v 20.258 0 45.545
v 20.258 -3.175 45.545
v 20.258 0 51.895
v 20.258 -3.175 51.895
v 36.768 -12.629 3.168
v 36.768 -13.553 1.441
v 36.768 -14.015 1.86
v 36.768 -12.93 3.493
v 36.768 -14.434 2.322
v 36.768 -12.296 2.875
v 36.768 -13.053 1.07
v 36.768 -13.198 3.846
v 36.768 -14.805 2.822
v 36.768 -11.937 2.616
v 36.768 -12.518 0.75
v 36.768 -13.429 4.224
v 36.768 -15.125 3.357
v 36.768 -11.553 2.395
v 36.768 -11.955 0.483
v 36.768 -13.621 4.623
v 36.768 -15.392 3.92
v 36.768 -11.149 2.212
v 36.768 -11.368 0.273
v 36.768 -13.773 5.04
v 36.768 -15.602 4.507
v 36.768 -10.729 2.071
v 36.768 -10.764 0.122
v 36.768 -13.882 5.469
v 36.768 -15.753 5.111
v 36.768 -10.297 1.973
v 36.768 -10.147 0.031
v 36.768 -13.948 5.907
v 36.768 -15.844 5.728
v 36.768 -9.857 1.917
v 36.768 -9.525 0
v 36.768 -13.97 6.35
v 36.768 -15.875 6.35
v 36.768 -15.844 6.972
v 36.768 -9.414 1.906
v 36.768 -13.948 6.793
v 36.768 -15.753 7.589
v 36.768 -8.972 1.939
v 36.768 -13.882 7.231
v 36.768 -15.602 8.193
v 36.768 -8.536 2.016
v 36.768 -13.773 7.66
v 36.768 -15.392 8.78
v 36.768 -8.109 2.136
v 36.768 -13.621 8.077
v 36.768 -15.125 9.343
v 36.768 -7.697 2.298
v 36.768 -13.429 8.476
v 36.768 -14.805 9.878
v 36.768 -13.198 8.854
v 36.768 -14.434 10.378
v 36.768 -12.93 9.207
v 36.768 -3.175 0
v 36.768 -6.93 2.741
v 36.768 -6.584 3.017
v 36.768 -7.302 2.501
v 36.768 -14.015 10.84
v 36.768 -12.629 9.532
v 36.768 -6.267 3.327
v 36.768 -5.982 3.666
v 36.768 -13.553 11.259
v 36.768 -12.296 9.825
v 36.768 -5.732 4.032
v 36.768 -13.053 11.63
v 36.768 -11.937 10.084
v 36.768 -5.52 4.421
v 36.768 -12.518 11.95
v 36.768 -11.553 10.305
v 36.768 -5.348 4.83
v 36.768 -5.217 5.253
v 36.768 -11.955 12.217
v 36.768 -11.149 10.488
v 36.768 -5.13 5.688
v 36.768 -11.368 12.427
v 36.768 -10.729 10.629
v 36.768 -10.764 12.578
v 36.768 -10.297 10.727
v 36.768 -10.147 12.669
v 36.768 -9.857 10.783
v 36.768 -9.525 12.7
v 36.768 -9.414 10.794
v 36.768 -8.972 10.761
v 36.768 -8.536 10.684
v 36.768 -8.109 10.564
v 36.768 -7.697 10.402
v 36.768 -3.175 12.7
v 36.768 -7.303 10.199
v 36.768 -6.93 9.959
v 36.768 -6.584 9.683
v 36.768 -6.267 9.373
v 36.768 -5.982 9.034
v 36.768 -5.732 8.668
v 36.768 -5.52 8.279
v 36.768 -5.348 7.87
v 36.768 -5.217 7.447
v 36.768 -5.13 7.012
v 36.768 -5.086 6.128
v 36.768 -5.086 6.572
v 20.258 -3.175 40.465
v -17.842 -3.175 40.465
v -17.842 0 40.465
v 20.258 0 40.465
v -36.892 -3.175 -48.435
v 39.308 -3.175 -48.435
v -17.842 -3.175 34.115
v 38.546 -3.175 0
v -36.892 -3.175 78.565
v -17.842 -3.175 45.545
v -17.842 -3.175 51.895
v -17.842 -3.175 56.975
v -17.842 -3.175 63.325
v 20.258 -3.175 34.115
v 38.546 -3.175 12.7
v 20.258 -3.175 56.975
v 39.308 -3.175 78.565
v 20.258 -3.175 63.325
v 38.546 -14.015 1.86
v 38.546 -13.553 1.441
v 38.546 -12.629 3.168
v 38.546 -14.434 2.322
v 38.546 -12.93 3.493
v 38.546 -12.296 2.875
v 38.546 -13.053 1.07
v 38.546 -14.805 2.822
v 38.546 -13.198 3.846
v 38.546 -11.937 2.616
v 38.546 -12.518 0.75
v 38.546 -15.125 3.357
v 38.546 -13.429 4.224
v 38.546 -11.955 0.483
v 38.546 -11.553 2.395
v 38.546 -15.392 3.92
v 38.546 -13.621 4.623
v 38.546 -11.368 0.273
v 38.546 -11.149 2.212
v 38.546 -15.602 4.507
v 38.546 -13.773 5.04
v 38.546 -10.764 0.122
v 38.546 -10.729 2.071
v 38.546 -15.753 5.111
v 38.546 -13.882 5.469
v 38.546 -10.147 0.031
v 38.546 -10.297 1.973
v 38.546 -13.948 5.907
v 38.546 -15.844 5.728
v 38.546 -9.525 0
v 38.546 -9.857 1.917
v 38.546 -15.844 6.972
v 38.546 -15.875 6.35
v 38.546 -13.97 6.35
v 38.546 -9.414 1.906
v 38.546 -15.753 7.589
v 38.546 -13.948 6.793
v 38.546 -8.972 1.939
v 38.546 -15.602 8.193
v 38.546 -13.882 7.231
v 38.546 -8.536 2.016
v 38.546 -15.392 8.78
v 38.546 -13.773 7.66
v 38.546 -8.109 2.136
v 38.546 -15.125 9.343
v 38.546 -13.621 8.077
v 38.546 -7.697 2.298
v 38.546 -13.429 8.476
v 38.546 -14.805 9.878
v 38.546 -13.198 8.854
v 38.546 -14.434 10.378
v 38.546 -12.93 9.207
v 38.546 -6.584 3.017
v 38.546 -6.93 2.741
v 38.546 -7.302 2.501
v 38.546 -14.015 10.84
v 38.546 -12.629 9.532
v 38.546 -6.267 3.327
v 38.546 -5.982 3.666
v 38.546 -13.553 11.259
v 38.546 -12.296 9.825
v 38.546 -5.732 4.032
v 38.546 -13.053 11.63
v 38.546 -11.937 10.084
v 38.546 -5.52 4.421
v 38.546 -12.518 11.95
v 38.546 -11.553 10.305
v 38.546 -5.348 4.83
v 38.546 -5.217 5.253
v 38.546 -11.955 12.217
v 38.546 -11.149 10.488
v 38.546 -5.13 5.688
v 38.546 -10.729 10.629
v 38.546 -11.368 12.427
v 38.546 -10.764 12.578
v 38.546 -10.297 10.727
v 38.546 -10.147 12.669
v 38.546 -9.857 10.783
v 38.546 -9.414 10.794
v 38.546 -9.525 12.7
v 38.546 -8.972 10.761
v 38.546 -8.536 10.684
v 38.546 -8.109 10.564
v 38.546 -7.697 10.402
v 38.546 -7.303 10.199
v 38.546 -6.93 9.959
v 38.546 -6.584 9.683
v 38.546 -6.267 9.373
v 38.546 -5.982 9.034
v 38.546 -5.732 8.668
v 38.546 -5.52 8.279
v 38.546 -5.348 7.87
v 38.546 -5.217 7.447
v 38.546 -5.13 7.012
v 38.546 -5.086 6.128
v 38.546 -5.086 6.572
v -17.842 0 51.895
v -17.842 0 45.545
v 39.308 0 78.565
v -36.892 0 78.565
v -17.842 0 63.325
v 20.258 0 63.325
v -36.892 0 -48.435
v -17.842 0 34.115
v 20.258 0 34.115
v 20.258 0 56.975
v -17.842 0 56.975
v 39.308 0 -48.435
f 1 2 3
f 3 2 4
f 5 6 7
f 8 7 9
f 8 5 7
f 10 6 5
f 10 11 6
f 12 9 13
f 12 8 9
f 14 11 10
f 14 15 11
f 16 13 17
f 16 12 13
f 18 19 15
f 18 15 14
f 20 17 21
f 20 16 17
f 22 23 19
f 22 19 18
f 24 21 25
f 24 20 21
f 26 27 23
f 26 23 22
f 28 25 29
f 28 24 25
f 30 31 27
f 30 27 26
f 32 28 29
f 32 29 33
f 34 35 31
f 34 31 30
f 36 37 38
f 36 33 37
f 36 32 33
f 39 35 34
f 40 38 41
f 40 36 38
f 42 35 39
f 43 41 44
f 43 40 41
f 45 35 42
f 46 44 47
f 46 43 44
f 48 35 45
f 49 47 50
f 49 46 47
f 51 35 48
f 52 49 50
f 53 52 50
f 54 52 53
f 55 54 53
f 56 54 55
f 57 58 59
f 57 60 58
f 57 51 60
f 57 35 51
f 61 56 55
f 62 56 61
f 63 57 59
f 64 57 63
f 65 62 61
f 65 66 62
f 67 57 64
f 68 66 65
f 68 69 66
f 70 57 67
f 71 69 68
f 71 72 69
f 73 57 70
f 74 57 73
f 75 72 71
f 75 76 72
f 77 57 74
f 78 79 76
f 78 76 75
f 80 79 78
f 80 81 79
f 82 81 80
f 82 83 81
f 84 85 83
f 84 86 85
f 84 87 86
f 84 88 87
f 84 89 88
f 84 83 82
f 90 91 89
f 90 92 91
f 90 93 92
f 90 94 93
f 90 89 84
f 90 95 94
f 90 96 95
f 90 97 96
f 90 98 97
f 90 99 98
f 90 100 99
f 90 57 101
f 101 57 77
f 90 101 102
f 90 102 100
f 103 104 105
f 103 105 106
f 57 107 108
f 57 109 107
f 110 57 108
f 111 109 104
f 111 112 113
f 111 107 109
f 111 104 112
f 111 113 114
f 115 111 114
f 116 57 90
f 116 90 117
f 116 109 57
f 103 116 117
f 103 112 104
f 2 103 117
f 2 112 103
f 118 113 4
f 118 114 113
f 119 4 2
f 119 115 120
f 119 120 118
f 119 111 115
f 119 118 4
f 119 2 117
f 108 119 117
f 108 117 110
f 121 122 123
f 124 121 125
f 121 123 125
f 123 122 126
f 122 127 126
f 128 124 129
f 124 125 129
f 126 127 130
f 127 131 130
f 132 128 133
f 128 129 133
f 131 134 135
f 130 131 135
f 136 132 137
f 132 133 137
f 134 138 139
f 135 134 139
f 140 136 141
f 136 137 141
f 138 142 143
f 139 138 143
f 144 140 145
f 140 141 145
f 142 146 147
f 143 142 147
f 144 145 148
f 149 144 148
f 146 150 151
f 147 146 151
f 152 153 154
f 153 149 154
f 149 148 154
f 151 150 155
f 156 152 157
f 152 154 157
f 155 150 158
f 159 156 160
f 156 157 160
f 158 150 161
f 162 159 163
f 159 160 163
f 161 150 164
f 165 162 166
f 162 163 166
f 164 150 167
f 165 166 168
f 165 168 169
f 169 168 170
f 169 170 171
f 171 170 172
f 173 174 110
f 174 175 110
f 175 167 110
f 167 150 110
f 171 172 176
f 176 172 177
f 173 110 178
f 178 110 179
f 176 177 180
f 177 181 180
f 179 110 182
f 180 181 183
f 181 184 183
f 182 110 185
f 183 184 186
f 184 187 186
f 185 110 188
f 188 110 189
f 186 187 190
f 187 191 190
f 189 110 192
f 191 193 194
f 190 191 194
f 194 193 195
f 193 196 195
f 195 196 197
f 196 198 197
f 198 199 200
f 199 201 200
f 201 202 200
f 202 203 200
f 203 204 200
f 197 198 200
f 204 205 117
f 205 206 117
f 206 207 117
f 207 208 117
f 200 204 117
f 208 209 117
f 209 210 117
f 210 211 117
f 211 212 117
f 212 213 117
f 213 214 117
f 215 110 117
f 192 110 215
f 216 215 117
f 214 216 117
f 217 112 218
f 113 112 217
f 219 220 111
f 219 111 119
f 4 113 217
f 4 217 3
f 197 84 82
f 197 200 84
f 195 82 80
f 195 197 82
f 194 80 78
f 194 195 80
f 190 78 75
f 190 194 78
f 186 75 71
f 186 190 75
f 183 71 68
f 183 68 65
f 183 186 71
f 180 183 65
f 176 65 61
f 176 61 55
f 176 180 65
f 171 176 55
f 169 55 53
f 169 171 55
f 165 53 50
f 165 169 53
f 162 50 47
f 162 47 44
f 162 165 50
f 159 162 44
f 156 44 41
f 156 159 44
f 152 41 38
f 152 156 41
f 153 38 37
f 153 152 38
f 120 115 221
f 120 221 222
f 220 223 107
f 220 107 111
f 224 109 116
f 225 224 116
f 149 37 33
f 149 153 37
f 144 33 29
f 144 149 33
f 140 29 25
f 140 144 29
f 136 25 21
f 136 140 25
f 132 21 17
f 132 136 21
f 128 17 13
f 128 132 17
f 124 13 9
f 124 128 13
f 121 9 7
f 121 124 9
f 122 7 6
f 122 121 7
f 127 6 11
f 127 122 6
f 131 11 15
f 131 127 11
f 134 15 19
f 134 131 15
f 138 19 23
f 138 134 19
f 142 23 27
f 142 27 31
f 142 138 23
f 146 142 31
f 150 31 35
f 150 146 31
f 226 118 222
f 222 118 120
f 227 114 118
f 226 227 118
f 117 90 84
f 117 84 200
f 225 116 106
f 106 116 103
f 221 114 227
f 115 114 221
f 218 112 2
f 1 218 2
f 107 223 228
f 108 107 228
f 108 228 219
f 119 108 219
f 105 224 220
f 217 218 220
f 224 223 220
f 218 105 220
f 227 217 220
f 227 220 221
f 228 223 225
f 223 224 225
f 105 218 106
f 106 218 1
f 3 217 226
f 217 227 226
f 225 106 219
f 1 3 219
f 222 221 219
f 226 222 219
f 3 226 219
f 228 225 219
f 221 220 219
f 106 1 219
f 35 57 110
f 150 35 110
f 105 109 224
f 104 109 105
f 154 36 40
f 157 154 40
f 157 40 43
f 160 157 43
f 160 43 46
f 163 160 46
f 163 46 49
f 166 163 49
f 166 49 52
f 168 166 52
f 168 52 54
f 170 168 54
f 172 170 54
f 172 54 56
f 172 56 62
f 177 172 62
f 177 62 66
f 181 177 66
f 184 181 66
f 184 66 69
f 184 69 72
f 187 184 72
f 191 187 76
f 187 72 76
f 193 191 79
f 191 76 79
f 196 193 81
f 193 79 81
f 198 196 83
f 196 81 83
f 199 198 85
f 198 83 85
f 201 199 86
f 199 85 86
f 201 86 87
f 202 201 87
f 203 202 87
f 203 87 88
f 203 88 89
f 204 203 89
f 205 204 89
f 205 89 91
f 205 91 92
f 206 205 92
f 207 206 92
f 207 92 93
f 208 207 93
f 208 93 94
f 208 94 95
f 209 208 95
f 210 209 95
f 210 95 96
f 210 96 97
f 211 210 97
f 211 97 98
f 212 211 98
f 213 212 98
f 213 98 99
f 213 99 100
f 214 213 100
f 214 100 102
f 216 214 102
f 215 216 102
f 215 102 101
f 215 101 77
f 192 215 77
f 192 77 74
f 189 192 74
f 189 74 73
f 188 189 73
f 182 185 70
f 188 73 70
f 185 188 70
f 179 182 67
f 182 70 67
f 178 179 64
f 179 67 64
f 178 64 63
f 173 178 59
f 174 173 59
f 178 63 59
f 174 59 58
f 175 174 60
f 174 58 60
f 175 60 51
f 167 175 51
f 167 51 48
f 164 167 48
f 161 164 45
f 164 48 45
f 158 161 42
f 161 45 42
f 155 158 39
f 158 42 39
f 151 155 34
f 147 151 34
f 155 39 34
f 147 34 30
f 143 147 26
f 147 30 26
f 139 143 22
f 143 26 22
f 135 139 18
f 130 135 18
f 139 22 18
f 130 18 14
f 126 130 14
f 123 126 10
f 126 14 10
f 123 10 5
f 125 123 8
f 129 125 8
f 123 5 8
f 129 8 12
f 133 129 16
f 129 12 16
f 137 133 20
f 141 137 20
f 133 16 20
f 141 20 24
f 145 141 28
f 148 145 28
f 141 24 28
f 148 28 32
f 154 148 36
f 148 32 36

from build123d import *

# Parameters (mm, degrees)
F0_W     = 76.2
F0_H     = 127
F1_DEPTH = 3.175
F2_W     = 38.1
F2_H     = 6.35
F3_DEPTH = 3.175
F4_W     = 1.778
F4_H     = 12.7
F5_DEPTH = 12.7
F6_R     = 6.35
F7_R     = 6.34999
F8_R     = 4.445
F9_DEPTH = 25.4


# Not quite as in the source:
# - a fillet or chamfer is up to 0.001 mm smaller than in the source, because OpenCascade refuses the exact size


with BuildPart() as f1:
    # F0 (on Front) → F1 (new body)
    with BuildSketch(Plane.XZ):
        with Locations((1.208204776, 15.0653144508)):
            Rectangle(F0_W, F0_H)
    extrude(amount=F1_DEPTH)

    # F2 (on face) → F3 (cut)
    with BuildSketch(Plane.XZ.offset(3.175)):
        with Locations((1.208204776, 60.1503144508)):
            Rectangle(F2_W, F2_H)
        with Locations((1.208204776, 48.7203144508)):
            Rectangle(F2_W, F2_H)
        with Locations((1.208204776, 37.2903144508)):
            Rectangle(F2_W, F2_H)
    extrude(amount=-F3_DEPTH, mode=Mode.SUBTRACT)

    # F4 (on face) → F5 (join)
    with BuildSketch(Plane.XZ.offset(3.175)):
        with Locations((37.657204776, 6.35)):
            Rectangle(F4_W, F4_H)
    extrude(amount=F5_DEPTH)

    # F6
    f6_edges = [f1.edges().sort_by_distance(p)[0] for p in [
        (37.657205, -15.875, 12.7),
    ]]
    fillet(f6_edges, radius=F6_R)

    # F7 (radius 6.35 in the source; OpenCascade refuses exactly that, so slightly less here)
    f7_edges = [f1.edges().sort_by_distance(p)[0] for p in [
        (37.657205, -15.875, 0),
    ]]
    fillet(f7_edges, radius=F7_R)

    # F8 (on face) → F9 (cut)
    with BuildSketch(Plane(origin=(36.768204776, 0, 0), x_dir=(0, -1, 0), z_dir=(-1, 0, 0))):
        with Locations((9.525, 6.35)):
            Circle(F8_R)
    extrude(amount=-F9_DEPTH, mode=Mode.SUBTRACT)


solid = f1.part
